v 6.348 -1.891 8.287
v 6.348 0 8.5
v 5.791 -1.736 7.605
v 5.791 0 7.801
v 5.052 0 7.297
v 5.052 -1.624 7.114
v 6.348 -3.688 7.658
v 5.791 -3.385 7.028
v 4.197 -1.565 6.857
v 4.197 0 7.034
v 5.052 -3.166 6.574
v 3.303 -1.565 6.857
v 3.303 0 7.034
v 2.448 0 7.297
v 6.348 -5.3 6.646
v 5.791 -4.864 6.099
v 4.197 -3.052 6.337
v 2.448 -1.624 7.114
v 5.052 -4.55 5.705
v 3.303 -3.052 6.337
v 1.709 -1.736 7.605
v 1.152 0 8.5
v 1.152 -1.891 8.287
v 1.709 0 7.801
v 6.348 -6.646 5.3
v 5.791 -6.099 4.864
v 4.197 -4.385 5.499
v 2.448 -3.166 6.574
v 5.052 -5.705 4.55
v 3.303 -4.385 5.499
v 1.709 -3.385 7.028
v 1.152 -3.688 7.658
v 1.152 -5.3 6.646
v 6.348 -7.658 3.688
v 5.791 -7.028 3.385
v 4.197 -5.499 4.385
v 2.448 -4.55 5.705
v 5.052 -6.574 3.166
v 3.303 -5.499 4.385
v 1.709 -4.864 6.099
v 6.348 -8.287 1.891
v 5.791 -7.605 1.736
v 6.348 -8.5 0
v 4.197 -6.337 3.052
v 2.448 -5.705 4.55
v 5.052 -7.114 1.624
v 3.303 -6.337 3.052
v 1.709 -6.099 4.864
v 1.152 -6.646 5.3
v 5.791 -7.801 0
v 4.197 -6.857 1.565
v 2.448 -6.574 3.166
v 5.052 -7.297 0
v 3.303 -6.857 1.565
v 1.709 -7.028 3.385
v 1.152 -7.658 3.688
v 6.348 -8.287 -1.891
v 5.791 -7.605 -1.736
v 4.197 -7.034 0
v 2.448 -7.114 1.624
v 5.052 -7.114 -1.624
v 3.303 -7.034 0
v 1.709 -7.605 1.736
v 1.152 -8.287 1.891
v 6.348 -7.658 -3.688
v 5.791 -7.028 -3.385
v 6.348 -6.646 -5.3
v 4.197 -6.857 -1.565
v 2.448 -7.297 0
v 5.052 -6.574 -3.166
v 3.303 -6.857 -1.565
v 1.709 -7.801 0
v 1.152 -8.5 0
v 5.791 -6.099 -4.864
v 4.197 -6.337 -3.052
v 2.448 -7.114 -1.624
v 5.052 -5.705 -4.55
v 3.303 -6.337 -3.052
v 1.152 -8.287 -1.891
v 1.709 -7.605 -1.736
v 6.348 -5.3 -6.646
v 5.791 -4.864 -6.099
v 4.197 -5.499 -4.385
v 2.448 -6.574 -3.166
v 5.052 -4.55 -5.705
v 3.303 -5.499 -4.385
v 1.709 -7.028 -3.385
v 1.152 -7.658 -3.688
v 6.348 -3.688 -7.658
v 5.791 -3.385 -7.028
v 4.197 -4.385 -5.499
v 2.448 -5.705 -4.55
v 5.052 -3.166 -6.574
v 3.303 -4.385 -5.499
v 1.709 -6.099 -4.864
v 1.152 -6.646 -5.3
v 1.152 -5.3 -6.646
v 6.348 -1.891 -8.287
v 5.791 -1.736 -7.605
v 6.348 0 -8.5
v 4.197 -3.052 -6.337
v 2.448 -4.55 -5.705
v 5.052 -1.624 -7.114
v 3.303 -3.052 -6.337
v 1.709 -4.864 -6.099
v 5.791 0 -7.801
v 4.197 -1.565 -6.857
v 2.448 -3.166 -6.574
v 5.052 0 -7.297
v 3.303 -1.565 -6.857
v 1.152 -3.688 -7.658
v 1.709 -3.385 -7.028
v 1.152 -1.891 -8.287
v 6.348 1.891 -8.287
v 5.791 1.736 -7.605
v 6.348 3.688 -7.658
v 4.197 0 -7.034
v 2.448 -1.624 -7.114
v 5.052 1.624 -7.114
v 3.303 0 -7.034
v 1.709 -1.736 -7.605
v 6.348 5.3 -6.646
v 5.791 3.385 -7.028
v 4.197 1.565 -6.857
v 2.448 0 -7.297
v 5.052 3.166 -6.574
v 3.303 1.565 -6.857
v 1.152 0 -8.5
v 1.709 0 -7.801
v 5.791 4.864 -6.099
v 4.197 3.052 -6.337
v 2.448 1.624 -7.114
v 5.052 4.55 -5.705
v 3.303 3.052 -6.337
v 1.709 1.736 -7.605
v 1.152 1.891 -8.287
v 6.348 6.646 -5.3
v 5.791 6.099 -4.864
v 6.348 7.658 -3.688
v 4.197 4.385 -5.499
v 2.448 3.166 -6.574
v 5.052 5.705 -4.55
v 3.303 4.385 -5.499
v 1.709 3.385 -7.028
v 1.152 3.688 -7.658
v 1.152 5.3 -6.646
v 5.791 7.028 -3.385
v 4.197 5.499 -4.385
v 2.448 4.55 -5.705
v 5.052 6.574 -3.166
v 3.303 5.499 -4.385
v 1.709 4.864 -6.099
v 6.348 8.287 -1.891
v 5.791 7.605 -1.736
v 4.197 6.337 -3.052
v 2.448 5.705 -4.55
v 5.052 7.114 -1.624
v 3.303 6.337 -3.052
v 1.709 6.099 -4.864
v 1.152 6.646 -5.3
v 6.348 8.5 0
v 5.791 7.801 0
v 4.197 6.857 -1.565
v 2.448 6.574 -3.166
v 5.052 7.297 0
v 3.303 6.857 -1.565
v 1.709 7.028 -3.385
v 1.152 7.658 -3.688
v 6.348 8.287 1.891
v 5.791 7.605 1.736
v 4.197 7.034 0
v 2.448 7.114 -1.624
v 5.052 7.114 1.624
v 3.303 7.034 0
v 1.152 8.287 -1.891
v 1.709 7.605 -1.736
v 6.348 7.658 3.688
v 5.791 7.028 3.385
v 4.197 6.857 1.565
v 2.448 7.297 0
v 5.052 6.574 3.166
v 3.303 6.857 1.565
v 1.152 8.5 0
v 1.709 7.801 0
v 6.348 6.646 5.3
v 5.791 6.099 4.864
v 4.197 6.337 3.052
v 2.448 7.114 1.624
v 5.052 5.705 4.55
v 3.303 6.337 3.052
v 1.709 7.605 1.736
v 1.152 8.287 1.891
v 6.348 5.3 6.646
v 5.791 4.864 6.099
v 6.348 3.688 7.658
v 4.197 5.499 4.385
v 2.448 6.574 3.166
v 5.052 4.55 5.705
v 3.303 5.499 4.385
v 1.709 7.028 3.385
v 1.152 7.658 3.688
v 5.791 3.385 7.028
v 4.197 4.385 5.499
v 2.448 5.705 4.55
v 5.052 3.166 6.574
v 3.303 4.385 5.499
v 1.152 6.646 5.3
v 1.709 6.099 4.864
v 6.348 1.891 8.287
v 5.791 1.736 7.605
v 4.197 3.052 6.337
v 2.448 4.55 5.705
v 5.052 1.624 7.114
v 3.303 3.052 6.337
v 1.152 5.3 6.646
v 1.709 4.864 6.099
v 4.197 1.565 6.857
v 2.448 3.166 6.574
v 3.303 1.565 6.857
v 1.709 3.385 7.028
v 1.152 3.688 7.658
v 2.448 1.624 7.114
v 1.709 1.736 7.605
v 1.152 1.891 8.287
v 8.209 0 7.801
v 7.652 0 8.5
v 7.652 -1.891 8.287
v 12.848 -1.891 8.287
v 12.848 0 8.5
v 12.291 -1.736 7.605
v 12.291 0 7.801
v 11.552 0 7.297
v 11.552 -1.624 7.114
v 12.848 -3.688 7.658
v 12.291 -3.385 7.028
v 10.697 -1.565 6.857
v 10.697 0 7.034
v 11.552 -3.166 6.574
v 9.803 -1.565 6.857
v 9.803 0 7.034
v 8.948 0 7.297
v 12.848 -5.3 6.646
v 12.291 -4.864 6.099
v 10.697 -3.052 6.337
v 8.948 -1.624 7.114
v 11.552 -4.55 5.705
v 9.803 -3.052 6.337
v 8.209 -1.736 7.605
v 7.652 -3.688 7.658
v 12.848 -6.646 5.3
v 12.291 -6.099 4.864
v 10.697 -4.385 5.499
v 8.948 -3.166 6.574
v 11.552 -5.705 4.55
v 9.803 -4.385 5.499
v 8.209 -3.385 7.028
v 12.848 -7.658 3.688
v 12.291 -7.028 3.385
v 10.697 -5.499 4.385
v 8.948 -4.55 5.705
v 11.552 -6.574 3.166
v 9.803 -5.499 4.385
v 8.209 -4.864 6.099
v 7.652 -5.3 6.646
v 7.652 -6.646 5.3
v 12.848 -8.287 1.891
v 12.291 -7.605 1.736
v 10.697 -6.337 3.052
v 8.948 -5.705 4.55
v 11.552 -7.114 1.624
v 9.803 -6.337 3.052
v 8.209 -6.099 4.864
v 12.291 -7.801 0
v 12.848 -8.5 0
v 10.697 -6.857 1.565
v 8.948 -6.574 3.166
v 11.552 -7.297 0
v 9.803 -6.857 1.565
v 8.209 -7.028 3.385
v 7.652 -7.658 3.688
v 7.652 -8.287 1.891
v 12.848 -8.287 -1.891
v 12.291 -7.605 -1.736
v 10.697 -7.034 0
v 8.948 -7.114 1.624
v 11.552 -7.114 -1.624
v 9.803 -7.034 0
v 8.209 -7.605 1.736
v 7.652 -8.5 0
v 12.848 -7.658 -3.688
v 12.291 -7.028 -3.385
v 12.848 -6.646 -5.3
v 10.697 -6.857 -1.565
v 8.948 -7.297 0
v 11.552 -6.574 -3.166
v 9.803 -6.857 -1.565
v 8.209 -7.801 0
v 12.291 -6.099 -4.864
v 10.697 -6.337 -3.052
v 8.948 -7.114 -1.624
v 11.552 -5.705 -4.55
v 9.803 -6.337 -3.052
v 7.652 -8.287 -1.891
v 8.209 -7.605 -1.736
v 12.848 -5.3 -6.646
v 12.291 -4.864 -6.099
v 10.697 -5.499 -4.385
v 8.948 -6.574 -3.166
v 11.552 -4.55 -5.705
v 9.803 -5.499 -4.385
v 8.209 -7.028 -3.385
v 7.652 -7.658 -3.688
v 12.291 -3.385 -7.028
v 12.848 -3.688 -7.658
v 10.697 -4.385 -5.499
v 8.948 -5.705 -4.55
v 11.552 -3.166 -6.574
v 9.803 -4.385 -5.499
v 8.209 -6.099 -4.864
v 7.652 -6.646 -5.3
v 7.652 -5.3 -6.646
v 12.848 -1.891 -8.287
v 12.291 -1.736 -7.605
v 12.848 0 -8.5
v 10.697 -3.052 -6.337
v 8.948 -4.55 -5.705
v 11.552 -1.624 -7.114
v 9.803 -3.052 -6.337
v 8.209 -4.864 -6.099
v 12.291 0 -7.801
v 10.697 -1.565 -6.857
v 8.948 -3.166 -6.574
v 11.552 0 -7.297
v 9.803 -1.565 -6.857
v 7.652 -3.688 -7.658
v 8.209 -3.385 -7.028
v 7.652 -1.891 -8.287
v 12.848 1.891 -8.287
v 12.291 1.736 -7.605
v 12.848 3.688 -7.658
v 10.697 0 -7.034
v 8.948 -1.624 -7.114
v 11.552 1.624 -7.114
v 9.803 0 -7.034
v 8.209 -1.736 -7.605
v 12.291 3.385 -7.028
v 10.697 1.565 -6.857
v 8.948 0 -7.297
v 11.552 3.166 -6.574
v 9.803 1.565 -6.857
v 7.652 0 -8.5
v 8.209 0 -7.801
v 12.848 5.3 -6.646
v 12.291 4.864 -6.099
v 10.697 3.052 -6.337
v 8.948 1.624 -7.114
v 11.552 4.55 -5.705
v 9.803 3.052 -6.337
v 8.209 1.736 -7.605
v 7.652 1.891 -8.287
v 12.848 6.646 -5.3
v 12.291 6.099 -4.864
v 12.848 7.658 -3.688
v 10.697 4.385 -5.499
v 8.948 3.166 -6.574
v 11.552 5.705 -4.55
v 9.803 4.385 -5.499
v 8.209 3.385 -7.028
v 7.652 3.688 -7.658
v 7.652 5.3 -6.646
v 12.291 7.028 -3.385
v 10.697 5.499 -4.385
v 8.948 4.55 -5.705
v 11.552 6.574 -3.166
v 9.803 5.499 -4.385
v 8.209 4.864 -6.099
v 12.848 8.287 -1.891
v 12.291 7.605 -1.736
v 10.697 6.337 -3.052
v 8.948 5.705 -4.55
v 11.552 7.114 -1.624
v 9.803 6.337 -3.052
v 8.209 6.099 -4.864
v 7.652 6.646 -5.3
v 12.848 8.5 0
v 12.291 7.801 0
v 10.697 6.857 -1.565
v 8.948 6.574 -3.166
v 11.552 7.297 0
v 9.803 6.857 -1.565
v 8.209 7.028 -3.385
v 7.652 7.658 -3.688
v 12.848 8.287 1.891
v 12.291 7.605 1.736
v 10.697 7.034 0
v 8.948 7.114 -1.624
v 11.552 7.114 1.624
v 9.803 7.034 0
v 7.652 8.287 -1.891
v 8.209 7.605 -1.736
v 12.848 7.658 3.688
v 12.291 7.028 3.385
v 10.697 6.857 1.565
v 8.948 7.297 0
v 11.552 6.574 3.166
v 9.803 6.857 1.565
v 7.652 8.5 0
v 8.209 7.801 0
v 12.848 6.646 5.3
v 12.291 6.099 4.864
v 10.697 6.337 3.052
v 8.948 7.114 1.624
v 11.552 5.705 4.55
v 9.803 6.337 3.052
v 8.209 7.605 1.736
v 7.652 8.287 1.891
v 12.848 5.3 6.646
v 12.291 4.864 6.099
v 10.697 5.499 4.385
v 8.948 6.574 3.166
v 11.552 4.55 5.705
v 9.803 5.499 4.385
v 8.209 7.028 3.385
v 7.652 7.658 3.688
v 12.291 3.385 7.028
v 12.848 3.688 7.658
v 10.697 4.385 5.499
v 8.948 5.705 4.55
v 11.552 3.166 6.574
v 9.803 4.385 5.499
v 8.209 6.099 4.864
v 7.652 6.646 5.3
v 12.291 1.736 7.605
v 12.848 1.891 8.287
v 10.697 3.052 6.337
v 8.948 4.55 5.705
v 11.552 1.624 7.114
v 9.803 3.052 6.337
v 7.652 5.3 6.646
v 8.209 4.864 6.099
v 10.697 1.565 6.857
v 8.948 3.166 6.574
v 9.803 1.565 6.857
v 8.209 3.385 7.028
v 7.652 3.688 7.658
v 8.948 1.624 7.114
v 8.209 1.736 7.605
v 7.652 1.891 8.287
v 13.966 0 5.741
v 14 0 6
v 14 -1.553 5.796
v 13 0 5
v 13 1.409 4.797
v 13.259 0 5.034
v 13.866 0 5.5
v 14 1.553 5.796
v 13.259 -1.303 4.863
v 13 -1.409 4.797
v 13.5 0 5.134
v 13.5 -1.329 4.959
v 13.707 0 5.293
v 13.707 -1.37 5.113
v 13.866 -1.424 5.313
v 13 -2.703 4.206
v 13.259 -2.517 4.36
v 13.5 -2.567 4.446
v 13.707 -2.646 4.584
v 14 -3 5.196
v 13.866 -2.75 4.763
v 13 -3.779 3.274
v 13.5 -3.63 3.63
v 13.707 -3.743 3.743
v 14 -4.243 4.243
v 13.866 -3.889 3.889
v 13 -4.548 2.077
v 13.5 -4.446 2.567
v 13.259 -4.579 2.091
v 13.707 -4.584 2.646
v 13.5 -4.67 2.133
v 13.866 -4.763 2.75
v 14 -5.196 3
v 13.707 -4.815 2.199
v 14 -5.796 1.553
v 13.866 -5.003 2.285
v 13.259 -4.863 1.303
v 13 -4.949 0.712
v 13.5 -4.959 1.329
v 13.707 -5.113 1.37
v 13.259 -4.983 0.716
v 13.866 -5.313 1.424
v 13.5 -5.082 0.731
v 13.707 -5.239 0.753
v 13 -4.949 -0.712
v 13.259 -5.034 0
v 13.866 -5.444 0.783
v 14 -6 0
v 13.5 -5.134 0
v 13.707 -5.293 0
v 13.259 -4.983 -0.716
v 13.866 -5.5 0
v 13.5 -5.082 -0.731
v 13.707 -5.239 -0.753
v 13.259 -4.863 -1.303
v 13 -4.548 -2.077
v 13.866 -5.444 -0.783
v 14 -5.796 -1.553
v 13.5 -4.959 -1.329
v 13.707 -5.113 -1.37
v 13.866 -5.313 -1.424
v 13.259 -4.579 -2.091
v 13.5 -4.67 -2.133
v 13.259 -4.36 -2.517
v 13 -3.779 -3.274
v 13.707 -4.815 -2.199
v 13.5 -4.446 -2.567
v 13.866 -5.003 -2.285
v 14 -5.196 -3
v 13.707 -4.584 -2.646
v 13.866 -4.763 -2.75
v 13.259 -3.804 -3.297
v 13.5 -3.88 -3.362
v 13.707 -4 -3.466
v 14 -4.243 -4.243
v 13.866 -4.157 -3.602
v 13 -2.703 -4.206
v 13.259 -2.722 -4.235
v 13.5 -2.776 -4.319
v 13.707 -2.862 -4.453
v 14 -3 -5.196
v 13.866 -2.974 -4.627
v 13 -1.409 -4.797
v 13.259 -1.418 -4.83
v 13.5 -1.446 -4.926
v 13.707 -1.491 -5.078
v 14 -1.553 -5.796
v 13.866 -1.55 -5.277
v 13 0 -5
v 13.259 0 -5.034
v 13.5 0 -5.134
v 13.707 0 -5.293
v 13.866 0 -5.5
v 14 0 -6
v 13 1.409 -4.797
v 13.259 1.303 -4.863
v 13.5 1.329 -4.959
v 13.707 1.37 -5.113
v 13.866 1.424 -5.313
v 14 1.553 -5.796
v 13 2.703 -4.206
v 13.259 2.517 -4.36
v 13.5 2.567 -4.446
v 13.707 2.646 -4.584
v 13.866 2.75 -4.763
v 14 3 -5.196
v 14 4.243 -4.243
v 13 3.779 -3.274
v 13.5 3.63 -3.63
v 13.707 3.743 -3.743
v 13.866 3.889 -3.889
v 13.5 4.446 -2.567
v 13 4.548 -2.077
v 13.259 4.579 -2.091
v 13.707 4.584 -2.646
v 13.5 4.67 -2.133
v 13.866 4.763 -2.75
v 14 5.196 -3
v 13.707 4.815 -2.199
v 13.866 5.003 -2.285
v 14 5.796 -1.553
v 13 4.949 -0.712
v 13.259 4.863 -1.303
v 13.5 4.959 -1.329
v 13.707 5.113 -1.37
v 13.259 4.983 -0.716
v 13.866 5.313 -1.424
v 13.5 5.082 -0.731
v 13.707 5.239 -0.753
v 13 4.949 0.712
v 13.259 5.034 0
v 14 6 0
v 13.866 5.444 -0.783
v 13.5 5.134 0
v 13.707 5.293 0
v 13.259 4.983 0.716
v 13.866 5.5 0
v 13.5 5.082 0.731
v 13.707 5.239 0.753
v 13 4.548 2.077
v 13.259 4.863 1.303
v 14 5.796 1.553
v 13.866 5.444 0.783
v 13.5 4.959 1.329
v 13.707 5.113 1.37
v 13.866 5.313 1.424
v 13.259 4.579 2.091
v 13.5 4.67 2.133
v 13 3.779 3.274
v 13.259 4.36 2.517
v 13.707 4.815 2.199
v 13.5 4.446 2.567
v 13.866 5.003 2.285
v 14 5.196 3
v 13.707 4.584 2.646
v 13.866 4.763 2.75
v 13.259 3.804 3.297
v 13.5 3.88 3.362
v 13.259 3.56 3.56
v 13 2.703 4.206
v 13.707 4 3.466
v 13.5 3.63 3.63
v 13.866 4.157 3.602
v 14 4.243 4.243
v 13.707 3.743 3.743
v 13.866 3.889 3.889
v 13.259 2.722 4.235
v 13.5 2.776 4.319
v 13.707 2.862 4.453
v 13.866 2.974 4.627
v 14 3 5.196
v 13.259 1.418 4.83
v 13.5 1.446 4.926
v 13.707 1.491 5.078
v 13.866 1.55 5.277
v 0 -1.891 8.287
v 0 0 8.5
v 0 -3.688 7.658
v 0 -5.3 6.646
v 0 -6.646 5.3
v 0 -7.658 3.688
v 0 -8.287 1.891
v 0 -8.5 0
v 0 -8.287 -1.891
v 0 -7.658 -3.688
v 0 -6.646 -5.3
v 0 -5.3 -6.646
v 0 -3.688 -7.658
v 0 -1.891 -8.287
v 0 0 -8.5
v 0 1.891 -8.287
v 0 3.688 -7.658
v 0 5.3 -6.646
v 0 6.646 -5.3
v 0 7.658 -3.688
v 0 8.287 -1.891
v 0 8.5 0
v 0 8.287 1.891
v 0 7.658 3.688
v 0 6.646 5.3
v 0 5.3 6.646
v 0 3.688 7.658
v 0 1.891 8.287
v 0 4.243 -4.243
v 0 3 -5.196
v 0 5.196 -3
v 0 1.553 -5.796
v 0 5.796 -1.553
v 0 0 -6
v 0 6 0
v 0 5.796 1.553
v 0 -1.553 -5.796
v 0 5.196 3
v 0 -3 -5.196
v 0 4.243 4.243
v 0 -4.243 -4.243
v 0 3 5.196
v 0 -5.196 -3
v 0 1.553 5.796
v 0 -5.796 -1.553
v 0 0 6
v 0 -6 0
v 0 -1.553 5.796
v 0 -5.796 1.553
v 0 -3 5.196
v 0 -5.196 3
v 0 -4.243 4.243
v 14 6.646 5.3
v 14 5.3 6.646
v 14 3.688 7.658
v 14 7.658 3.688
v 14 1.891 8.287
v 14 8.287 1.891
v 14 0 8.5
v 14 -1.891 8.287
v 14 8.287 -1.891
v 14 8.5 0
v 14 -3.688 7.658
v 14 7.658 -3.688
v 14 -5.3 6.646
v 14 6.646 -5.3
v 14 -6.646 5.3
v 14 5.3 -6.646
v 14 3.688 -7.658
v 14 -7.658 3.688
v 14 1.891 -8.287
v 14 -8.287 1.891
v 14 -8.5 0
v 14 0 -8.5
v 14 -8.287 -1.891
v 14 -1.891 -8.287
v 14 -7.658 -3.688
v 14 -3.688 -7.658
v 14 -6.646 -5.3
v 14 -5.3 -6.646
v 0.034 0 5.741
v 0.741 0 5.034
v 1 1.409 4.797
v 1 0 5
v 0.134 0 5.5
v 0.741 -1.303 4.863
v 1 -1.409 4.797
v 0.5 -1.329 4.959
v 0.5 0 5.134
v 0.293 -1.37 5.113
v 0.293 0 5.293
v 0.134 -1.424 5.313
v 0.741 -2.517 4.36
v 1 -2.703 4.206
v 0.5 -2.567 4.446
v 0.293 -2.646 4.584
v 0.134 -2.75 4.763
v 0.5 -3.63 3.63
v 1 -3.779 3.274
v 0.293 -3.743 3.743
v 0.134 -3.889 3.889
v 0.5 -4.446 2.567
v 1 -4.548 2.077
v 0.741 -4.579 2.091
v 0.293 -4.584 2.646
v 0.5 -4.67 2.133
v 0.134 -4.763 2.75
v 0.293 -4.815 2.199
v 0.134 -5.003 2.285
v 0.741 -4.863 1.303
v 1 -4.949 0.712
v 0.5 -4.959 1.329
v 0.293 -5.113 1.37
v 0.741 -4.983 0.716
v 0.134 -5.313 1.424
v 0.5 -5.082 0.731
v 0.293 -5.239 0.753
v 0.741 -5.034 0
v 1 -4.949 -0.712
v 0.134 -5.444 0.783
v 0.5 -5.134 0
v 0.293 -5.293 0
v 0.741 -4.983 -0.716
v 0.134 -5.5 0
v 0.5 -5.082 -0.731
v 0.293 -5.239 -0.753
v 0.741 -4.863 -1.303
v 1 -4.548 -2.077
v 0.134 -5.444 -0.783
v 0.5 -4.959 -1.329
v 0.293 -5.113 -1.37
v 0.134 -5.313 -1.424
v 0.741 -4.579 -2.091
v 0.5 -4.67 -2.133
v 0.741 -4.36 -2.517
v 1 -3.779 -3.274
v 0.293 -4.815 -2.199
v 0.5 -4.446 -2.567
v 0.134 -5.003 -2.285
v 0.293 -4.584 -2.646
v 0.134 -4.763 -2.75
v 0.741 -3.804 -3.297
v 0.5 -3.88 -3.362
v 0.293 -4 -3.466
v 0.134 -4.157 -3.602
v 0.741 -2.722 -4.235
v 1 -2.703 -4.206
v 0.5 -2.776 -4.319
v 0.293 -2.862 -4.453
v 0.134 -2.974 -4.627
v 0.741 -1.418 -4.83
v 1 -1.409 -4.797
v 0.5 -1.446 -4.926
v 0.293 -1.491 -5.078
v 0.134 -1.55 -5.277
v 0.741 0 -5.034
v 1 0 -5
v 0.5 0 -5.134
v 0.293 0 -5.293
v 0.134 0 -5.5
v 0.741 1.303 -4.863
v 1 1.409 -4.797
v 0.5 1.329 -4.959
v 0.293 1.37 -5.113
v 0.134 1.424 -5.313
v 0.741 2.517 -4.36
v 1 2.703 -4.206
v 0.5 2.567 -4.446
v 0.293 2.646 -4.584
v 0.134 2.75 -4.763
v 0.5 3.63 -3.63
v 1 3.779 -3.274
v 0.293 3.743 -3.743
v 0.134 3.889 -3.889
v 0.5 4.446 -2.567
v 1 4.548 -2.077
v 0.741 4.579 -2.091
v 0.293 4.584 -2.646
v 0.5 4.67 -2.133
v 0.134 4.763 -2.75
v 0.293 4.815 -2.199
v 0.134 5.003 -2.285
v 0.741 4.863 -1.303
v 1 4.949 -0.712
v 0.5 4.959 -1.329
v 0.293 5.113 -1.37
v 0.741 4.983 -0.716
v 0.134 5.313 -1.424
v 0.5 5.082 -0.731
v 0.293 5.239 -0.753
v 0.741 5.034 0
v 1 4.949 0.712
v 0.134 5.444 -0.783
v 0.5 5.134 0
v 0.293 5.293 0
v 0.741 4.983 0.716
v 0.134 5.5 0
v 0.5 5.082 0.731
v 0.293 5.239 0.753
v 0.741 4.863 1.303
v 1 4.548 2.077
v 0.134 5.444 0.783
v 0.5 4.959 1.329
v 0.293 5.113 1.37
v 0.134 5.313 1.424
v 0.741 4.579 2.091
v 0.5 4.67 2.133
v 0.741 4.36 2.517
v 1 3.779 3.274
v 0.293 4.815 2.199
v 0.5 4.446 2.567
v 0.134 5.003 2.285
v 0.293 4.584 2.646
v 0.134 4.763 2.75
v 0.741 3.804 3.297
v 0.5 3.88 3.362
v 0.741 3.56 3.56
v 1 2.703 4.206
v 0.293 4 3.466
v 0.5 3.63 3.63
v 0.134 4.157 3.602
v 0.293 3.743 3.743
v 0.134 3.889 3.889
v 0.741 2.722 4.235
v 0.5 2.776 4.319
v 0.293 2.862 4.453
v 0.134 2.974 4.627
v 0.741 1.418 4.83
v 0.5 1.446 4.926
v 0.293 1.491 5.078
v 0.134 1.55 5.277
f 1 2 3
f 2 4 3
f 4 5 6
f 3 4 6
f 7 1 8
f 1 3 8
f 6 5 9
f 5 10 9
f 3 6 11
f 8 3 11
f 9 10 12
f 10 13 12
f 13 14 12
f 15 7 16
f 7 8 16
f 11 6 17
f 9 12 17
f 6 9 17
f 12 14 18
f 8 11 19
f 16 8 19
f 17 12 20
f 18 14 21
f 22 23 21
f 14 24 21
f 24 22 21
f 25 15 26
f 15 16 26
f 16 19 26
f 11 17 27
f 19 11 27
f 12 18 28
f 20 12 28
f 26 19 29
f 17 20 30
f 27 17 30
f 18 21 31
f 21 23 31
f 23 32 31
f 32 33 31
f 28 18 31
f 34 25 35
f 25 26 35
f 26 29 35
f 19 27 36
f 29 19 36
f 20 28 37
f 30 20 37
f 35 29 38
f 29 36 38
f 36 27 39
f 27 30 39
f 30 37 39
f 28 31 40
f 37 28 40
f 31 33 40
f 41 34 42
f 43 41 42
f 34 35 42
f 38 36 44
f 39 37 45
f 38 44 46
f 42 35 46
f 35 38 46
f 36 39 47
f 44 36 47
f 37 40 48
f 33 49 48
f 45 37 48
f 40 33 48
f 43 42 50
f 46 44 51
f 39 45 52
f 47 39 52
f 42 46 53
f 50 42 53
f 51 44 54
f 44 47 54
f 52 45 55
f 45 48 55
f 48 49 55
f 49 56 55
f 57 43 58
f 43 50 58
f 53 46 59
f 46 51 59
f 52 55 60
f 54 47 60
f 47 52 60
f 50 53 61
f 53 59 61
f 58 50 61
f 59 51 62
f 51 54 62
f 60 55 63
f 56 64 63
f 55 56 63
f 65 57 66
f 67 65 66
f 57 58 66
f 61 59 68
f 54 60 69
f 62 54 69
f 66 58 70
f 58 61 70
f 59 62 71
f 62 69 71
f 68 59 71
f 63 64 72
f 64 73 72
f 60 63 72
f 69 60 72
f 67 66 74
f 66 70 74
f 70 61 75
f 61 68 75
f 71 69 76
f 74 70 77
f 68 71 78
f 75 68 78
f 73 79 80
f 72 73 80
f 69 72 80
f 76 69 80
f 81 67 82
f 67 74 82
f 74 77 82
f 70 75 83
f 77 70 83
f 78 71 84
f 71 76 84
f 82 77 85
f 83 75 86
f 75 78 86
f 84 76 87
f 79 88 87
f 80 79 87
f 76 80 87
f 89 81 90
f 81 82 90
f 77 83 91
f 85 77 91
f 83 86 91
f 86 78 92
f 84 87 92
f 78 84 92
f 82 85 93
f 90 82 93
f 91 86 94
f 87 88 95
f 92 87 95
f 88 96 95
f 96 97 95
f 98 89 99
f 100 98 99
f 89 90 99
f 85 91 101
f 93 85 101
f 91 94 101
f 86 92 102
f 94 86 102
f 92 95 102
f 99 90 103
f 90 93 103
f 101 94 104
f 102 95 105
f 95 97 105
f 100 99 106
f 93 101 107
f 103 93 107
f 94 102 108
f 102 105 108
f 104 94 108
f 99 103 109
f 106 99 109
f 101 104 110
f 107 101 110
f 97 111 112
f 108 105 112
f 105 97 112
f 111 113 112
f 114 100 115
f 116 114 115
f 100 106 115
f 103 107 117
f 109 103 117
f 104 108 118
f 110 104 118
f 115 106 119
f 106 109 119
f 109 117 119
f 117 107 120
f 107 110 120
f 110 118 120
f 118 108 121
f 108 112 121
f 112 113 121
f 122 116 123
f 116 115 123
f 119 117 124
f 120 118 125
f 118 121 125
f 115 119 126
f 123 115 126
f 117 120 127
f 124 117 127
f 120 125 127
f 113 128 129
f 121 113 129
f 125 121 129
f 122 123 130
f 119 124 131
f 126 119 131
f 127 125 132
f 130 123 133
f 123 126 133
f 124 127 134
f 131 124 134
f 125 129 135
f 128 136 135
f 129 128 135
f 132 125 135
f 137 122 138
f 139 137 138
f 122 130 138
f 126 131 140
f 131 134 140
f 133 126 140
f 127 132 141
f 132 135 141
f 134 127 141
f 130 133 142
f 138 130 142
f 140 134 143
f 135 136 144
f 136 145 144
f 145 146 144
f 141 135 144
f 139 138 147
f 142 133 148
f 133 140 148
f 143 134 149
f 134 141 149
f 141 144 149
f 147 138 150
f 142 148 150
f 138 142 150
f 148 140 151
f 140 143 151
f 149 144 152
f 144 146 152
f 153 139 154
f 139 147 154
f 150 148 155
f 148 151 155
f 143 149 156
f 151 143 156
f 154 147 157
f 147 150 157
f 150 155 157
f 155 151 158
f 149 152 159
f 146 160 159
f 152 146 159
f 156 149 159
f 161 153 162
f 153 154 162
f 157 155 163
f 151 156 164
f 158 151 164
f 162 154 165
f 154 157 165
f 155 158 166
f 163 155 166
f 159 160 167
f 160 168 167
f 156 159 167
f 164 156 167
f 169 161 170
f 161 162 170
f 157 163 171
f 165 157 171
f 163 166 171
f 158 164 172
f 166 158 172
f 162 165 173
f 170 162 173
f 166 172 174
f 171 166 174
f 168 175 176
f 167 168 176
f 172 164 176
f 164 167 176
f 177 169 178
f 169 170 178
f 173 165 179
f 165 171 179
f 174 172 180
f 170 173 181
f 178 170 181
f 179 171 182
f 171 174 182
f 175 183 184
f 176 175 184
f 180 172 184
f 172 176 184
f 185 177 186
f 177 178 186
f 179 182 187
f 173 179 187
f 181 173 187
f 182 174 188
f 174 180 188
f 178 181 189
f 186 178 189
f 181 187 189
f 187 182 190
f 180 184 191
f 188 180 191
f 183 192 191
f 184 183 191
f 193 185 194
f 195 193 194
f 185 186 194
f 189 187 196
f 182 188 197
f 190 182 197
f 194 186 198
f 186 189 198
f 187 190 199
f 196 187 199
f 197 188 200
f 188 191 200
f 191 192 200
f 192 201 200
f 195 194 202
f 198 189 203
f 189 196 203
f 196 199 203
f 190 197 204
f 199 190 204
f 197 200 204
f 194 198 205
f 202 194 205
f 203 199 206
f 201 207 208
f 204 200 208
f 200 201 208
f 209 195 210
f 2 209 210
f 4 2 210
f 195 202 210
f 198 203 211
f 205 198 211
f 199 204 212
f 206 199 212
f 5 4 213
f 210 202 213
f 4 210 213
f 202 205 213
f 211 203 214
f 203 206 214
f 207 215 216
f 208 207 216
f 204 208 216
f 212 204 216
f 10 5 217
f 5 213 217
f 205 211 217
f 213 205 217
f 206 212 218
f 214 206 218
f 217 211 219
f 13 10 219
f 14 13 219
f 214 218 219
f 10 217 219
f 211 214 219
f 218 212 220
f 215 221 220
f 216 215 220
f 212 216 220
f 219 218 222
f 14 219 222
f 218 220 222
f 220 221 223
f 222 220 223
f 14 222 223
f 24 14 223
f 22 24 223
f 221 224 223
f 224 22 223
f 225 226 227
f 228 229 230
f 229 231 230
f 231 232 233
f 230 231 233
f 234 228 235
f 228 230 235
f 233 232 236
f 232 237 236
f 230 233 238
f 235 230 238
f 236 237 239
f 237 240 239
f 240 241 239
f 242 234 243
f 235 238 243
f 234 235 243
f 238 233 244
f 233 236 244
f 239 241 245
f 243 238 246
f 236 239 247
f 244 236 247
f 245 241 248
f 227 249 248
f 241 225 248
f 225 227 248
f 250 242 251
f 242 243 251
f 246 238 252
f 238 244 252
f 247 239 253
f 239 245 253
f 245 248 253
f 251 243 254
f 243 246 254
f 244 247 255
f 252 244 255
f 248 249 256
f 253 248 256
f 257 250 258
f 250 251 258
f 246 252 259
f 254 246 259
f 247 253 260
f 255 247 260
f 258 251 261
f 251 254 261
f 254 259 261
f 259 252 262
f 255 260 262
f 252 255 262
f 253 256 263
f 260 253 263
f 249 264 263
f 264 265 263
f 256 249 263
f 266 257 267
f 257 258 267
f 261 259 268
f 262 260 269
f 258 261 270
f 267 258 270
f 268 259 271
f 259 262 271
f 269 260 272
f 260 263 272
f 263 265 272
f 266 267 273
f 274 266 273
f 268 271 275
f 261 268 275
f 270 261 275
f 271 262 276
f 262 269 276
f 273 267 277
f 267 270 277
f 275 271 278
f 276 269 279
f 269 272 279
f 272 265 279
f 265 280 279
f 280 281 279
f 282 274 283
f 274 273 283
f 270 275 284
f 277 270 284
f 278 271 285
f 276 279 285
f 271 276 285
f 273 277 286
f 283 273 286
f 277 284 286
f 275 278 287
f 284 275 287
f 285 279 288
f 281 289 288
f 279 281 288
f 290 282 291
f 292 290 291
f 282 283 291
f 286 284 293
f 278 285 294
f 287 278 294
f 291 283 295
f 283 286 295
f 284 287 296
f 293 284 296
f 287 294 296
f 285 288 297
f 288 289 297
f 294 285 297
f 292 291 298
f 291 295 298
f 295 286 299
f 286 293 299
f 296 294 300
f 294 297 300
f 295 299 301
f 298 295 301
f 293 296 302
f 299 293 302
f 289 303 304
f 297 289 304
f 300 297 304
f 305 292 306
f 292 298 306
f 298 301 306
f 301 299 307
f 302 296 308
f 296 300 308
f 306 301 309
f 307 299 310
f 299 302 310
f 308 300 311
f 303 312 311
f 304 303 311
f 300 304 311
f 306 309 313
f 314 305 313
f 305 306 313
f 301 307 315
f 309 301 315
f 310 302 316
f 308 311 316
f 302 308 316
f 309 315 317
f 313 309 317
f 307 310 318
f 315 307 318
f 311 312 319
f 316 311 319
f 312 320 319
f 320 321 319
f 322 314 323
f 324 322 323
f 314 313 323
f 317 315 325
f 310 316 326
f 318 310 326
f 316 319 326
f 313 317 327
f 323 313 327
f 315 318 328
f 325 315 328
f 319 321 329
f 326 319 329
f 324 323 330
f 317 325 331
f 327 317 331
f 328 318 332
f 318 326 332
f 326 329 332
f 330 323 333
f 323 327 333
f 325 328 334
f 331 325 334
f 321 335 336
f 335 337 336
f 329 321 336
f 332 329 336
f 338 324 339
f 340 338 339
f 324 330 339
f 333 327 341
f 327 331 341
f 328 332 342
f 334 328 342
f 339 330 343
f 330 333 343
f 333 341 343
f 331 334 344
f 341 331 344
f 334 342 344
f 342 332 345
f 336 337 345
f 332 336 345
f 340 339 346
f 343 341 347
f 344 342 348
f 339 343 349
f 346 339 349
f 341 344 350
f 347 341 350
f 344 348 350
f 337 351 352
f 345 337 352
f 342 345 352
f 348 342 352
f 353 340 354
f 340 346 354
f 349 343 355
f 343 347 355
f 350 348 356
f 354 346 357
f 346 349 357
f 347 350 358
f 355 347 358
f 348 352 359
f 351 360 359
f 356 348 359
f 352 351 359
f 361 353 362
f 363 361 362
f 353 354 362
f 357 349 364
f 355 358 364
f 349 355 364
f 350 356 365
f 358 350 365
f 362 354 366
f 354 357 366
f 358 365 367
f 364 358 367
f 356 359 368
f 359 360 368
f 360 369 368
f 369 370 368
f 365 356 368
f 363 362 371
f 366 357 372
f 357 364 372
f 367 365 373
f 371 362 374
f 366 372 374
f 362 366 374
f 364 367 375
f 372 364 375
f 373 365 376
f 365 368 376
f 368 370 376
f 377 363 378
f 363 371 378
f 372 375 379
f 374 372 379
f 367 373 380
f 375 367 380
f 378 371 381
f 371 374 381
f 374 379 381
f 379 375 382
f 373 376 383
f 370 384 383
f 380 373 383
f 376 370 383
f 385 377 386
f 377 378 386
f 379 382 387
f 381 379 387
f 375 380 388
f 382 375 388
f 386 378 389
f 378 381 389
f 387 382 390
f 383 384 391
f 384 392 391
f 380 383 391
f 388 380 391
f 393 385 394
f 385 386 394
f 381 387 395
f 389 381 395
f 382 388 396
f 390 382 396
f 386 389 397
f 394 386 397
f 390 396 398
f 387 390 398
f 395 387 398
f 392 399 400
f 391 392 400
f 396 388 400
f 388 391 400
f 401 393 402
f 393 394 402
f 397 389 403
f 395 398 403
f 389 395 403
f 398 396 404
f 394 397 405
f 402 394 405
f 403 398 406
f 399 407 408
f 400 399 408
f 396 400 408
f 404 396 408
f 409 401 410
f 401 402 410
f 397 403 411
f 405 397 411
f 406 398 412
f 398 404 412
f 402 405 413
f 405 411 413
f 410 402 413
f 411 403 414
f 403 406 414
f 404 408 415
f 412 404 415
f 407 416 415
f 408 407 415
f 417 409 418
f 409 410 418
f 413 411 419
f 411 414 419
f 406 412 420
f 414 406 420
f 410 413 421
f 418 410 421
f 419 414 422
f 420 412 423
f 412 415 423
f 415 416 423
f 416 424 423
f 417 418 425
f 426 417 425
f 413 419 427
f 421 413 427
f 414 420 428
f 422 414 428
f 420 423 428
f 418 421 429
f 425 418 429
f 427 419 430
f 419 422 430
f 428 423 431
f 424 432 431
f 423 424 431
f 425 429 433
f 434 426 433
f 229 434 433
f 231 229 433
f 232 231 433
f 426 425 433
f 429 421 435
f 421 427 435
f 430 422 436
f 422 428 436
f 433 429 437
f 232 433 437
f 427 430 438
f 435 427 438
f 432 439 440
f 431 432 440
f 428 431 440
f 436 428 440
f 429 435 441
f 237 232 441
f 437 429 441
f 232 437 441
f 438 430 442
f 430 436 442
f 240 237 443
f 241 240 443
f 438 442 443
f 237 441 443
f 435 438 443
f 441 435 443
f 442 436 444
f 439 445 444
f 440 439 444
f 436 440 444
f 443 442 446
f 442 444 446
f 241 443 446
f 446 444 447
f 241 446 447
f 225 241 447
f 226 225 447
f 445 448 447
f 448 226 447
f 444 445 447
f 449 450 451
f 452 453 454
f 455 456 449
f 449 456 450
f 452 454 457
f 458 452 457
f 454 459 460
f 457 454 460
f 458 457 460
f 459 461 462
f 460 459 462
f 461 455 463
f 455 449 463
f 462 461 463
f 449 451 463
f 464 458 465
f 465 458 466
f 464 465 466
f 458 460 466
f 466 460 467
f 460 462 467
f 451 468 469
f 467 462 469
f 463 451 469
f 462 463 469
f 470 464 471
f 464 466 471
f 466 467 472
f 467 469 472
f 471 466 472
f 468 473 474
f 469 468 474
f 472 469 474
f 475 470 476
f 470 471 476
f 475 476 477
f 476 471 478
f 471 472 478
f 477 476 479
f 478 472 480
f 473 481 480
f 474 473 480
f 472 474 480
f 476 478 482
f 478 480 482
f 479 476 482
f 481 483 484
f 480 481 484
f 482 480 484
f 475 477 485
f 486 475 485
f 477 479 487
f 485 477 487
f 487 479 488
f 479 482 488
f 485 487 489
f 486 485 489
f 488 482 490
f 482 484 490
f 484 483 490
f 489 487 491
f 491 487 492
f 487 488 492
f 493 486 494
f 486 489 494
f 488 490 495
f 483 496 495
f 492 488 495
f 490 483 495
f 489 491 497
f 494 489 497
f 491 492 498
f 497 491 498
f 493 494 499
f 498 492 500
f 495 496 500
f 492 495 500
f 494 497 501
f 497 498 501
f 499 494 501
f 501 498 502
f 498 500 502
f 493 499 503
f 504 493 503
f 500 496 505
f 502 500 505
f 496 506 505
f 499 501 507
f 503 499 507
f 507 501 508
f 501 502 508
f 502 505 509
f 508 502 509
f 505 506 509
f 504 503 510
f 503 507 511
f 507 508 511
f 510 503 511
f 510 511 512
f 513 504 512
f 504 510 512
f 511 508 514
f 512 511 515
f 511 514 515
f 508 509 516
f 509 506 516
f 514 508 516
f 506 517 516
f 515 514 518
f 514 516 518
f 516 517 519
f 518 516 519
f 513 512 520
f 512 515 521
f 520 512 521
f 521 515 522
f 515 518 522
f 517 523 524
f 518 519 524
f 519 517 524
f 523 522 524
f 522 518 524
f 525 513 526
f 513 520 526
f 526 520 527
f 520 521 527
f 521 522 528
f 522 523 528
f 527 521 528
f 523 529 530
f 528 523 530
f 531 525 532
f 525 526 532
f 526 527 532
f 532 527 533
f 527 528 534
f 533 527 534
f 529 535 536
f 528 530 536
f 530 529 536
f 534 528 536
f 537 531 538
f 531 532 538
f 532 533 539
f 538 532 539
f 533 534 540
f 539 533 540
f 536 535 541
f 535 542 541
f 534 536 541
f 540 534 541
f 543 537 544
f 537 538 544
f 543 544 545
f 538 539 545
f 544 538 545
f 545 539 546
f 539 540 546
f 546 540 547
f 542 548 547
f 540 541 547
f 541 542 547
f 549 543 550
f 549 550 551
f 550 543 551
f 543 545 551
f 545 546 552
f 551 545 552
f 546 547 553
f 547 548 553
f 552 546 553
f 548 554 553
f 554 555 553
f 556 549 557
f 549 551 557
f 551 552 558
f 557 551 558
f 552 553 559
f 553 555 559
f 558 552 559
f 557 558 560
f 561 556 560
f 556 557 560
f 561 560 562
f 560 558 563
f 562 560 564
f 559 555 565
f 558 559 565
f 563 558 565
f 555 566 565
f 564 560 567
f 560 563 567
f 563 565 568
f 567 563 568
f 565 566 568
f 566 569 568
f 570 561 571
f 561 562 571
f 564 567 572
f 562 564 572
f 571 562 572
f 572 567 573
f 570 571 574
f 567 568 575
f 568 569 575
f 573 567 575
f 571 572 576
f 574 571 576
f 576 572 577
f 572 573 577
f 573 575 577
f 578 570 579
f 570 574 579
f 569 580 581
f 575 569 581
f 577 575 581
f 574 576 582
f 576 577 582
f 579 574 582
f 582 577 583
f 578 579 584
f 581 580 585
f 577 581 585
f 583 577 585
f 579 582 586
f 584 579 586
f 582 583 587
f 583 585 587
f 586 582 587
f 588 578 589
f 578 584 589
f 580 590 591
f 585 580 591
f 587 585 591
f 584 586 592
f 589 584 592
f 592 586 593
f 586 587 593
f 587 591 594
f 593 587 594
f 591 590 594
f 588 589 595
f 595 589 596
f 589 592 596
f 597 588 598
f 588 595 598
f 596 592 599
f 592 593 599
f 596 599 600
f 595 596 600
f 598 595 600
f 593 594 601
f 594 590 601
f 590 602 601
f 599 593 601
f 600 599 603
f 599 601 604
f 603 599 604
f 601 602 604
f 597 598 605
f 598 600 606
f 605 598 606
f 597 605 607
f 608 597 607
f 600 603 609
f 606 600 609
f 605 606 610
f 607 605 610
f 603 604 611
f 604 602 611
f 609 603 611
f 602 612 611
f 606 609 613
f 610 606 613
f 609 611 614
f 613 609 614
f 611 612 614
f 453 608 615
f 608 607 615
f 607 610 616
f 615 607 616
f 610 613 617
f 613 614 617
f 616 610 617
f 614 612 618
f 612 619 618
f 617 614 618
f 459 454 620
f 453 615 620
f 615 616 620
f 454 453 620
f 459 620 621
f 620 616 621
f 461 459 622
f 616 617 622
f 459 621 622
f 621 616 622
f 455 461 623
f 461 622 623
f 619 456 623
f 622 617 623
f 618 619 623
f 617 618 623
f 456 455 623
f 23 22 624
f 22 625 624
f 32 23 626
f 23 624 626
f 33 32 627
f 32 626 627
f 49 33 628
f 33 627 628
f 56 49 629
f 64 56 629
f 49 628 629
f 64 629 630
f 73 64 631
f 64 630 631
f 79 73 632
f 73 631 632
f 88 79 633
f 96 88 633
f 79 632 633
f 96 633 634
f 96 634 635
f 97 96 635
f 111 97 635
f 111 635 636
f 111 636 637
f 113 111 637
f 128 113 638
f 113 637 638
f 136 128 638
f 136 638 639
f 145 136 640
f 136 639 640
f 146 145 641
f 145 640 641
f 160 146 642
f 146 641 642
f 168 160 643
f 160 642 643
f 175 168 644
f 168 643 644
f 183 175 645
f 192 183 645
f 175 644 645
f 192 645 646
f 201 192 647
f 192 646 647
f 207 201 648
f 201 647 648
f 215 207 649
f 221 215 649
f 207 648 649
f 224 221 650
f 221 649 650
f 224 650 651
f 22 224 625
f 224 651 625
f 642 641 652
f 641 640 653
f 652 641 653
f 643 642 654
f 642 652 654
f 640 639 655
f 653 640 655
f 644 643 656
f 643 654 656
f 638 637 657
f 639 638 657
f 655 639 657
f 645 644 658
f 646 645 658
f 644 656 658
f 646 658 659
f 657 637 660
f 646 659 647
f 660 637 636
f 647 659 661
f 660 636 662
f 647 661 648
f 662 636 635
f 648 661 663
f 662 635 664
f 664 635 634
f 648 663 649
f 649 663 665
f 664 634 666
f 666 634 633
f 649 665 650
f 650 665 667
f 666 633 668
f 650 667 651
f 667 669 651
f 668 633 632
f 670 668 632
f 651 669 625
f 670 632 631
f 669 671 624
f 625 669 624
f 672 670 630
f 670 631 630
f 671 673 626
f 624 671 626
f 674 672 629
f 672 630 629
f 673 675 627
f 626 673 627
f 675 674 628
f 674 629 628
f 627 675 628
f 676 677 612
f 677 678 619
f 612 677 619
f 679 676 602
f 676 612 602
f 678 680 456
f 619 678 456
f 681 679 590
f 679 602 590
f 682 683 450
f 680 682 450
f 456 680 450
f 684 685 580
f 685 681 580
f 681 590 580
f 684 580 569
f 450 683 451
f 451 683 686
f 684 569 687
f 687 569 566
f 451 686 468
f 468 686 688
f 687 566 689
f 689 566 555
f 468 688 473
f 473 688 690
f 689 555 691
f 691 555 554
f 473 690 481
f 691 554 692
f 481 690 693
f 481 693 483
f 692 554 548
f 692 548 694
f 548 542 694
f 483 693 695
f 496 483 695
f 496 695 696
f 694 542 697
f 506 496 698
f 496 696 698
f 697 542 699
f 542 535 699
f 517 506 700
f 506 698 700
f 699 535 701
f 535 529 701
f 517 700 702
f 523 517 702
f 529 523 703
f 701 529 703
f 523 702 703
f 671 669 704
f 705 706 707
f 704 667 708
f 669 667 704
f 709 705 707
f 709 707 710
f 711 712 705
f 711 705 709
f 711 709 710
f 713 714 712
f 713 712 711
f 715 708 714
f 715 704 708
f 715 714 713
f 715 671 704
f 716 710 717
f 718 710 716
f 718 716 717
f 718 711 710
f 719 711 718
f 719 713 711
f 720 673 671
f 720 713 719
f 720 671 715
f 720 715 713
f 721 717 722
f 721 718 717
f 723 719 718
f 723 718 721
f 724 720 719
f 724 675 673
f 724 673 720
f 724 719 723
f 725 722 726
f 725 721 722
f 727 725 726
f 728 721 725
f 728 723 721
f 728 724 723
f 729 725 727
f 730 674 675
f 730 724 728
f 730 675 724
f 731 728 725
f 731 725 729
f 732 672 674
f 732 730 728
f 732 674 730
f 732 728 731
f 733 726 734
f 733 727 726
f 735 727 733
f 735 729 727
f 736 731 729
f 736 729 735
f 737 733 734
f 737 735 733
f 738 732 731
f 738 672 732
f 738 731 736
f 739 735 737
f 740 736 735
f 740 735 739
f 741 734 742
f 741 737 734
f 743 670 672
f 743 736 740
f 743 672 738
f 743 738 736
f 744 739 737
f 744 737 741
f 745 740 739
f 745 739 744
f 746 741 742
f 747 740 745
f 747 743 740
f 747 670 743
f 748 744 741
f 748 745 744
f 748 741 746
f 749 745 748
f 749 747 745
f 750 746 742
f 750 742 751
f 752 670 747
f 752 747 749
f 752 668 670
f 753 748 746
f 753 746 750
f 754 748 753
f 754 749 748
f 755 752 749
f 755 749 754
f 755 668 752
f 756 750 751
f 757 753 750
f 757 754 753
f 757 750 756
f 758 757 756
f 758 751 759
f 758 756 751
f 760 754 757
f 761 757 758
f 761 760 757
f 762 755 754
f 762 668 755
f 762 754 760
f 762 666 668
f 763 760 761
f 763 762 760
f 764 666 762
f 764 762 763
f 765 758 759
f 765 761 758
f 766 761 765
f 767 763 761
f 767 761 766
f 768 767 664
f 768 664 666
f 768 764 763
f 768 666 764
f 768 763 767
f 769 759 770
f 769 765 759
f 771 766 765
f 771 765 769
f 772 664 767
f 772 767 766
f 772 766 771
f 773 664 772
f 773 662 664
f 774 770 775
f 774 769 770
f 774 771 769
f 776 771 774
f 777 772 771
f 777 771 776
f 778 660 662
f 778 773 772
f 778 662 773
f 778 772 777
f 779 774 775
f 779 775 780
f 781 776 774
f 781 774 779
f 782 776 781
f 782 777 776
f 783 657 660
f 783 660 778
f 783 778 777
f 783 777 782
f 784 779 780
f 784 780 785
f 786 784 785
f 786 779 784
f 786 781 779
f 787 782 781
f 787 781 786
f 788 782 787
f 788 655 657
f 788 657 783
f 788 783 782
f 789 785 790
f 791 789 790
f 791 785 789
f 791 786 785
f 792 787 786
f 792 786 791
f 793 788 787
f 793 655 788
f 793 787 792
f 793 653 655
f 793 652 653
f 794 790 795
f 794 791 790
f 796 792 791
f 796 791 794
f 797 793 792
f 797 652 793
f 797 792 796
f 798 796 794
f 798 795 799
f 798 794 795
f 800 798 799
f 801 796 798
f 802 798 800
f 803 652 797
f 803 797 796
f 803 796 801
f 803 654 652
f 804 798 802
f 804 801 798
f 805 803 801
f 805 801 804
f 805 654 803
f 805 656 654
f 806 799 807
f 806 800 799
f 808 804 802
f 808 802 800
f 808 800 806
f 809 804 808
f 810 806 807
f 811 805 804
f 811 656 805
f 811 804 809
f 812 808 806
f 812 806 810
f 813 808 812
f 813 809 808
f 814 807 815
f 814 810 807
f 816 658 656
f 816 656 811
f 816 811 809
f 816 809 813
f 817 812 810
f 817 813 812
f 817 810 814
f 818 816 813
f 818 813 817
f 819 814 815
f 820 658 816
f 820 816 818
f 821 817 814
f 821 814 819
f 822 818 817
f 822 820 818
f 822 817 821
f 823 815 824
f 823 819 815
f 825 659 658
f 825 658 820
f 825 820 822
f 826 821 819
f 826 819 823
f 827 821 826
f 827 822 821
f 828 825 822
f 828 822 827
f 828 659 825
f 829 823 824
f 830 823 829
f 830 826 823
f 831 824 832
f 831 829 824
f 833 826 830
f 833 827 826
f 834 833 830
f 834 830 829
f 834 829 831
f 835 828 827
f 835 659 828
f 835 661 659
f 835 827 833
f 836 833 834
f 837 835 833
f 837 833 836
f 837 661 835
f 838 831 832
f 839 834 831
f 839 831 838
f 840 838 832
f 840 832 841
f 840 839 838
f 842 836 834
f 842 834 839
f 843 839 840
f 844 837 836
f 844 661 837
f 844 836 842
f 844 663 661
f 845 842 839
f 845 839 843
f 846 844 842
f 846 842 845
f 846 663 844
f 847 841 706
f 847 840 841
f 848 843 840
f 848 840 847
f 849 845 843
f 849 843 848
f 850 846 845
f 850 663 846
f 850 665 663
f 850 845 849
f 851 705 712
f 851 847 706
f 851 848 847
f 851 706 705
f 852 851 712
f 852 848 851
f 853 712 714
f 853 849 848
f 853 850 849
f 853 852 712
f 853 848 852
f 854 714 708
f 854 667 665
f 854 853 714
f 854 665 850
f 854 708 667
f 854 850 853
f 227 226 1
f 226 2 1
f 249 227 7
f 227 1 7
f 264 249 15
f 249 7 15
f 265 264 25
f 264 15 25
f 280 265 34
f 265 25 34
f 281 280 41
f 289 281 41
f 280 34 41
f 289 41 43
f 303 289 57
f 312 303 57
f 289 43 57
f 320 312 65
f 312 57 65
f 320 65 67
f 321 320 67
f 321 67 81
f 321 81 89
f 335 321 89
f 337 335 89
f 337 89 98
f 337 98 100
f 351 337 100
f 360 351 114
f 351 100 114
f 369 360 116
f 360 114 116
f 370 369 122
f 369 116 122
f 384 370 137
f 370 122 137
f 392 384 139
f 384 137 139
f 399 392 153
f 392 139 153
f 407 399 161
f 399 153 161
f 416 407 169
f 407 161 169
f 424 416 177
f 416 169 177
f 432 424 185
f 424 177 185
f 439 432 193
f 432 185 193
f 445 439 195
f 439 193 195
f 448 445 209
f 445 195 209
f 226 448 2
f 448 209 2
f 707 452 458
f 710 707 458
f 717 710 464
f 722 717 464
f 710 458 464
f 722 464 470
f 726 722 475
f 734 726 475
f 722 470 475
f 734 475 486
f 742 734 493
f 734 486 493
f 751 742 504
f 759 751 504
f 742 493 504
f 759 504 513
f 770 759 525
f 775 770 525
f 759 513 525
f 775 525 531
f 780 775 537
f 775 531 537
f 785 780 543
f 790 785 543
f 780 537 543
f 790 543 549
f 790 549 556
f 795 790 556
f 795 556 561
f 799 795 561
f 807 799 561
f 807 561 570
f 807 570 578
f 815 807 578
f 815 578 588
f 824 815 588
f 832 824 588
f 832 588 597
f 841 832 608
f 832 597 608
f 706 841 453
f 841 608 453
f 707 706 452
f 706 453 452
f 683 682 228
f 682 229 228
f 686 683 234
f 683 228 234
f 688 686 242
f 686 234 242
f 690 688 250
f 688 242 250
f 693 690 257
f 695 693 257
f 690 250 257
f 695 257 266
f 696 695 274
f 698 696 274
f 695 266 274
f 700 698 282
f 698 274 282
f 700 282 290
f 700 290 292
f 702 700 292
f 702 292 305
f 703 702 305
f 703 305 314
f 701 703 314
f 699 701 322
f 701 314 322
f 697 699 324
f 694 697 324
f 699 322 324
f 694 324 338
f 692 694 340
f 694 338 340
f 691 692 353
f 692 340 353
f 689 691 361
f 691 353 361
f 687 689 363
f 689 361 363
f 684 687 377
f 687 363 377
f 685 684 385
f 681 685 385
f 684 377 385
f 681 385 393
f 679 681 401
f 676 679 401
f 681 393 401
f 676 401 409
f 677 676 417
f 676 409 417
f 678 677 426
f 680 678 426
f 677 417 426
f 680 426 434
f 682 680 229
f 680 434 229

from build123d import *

# Parameters (mm, degrees)
CONG_1_R = 1


with BuildPart() as part:
    # Esquisse1 → Base-Révolution (revolve)
    with BuildSketch(Plane.XY, mode=Mode.PRIVATE) as base_r_volution_sk:
        with BuildLine():
            Line((0, 5), (14, 5))
            Line((14, 5), (14, 8.5))
            Line((14, 8.5), (12.848076211, 8.5))
            ThreePointArc((12.848076211, 8.5), (10.25, 7), (7.651923789, 8.5))
            Line((7.651923789, 8.5), (6.348076211, 8.5))
            ThreePointArc((6.348076211, 8.5), (3.75, 7), (1.151923789, 8.5))
            Line((1.151923789, 8.5), (0, 8.5))
            Line((0, 8.5), (0, 5))
        make_face()
    revolve(base_r_volution_sk.sketch.rotate(Axis((0, 0, 0), (1, 0, 0)), 90), axis=Axis((0, 0, 0), (1, 0, 0)))

    # Congé1
    cong_1_edges = [part.edges().sort_by_distance(p)[0] for p in [
        (14, 0, -5),
        (0, 0, -5),
    ]]
    fillet(cong_1_edges, radius=CONG_1_R)


solid = part.part
